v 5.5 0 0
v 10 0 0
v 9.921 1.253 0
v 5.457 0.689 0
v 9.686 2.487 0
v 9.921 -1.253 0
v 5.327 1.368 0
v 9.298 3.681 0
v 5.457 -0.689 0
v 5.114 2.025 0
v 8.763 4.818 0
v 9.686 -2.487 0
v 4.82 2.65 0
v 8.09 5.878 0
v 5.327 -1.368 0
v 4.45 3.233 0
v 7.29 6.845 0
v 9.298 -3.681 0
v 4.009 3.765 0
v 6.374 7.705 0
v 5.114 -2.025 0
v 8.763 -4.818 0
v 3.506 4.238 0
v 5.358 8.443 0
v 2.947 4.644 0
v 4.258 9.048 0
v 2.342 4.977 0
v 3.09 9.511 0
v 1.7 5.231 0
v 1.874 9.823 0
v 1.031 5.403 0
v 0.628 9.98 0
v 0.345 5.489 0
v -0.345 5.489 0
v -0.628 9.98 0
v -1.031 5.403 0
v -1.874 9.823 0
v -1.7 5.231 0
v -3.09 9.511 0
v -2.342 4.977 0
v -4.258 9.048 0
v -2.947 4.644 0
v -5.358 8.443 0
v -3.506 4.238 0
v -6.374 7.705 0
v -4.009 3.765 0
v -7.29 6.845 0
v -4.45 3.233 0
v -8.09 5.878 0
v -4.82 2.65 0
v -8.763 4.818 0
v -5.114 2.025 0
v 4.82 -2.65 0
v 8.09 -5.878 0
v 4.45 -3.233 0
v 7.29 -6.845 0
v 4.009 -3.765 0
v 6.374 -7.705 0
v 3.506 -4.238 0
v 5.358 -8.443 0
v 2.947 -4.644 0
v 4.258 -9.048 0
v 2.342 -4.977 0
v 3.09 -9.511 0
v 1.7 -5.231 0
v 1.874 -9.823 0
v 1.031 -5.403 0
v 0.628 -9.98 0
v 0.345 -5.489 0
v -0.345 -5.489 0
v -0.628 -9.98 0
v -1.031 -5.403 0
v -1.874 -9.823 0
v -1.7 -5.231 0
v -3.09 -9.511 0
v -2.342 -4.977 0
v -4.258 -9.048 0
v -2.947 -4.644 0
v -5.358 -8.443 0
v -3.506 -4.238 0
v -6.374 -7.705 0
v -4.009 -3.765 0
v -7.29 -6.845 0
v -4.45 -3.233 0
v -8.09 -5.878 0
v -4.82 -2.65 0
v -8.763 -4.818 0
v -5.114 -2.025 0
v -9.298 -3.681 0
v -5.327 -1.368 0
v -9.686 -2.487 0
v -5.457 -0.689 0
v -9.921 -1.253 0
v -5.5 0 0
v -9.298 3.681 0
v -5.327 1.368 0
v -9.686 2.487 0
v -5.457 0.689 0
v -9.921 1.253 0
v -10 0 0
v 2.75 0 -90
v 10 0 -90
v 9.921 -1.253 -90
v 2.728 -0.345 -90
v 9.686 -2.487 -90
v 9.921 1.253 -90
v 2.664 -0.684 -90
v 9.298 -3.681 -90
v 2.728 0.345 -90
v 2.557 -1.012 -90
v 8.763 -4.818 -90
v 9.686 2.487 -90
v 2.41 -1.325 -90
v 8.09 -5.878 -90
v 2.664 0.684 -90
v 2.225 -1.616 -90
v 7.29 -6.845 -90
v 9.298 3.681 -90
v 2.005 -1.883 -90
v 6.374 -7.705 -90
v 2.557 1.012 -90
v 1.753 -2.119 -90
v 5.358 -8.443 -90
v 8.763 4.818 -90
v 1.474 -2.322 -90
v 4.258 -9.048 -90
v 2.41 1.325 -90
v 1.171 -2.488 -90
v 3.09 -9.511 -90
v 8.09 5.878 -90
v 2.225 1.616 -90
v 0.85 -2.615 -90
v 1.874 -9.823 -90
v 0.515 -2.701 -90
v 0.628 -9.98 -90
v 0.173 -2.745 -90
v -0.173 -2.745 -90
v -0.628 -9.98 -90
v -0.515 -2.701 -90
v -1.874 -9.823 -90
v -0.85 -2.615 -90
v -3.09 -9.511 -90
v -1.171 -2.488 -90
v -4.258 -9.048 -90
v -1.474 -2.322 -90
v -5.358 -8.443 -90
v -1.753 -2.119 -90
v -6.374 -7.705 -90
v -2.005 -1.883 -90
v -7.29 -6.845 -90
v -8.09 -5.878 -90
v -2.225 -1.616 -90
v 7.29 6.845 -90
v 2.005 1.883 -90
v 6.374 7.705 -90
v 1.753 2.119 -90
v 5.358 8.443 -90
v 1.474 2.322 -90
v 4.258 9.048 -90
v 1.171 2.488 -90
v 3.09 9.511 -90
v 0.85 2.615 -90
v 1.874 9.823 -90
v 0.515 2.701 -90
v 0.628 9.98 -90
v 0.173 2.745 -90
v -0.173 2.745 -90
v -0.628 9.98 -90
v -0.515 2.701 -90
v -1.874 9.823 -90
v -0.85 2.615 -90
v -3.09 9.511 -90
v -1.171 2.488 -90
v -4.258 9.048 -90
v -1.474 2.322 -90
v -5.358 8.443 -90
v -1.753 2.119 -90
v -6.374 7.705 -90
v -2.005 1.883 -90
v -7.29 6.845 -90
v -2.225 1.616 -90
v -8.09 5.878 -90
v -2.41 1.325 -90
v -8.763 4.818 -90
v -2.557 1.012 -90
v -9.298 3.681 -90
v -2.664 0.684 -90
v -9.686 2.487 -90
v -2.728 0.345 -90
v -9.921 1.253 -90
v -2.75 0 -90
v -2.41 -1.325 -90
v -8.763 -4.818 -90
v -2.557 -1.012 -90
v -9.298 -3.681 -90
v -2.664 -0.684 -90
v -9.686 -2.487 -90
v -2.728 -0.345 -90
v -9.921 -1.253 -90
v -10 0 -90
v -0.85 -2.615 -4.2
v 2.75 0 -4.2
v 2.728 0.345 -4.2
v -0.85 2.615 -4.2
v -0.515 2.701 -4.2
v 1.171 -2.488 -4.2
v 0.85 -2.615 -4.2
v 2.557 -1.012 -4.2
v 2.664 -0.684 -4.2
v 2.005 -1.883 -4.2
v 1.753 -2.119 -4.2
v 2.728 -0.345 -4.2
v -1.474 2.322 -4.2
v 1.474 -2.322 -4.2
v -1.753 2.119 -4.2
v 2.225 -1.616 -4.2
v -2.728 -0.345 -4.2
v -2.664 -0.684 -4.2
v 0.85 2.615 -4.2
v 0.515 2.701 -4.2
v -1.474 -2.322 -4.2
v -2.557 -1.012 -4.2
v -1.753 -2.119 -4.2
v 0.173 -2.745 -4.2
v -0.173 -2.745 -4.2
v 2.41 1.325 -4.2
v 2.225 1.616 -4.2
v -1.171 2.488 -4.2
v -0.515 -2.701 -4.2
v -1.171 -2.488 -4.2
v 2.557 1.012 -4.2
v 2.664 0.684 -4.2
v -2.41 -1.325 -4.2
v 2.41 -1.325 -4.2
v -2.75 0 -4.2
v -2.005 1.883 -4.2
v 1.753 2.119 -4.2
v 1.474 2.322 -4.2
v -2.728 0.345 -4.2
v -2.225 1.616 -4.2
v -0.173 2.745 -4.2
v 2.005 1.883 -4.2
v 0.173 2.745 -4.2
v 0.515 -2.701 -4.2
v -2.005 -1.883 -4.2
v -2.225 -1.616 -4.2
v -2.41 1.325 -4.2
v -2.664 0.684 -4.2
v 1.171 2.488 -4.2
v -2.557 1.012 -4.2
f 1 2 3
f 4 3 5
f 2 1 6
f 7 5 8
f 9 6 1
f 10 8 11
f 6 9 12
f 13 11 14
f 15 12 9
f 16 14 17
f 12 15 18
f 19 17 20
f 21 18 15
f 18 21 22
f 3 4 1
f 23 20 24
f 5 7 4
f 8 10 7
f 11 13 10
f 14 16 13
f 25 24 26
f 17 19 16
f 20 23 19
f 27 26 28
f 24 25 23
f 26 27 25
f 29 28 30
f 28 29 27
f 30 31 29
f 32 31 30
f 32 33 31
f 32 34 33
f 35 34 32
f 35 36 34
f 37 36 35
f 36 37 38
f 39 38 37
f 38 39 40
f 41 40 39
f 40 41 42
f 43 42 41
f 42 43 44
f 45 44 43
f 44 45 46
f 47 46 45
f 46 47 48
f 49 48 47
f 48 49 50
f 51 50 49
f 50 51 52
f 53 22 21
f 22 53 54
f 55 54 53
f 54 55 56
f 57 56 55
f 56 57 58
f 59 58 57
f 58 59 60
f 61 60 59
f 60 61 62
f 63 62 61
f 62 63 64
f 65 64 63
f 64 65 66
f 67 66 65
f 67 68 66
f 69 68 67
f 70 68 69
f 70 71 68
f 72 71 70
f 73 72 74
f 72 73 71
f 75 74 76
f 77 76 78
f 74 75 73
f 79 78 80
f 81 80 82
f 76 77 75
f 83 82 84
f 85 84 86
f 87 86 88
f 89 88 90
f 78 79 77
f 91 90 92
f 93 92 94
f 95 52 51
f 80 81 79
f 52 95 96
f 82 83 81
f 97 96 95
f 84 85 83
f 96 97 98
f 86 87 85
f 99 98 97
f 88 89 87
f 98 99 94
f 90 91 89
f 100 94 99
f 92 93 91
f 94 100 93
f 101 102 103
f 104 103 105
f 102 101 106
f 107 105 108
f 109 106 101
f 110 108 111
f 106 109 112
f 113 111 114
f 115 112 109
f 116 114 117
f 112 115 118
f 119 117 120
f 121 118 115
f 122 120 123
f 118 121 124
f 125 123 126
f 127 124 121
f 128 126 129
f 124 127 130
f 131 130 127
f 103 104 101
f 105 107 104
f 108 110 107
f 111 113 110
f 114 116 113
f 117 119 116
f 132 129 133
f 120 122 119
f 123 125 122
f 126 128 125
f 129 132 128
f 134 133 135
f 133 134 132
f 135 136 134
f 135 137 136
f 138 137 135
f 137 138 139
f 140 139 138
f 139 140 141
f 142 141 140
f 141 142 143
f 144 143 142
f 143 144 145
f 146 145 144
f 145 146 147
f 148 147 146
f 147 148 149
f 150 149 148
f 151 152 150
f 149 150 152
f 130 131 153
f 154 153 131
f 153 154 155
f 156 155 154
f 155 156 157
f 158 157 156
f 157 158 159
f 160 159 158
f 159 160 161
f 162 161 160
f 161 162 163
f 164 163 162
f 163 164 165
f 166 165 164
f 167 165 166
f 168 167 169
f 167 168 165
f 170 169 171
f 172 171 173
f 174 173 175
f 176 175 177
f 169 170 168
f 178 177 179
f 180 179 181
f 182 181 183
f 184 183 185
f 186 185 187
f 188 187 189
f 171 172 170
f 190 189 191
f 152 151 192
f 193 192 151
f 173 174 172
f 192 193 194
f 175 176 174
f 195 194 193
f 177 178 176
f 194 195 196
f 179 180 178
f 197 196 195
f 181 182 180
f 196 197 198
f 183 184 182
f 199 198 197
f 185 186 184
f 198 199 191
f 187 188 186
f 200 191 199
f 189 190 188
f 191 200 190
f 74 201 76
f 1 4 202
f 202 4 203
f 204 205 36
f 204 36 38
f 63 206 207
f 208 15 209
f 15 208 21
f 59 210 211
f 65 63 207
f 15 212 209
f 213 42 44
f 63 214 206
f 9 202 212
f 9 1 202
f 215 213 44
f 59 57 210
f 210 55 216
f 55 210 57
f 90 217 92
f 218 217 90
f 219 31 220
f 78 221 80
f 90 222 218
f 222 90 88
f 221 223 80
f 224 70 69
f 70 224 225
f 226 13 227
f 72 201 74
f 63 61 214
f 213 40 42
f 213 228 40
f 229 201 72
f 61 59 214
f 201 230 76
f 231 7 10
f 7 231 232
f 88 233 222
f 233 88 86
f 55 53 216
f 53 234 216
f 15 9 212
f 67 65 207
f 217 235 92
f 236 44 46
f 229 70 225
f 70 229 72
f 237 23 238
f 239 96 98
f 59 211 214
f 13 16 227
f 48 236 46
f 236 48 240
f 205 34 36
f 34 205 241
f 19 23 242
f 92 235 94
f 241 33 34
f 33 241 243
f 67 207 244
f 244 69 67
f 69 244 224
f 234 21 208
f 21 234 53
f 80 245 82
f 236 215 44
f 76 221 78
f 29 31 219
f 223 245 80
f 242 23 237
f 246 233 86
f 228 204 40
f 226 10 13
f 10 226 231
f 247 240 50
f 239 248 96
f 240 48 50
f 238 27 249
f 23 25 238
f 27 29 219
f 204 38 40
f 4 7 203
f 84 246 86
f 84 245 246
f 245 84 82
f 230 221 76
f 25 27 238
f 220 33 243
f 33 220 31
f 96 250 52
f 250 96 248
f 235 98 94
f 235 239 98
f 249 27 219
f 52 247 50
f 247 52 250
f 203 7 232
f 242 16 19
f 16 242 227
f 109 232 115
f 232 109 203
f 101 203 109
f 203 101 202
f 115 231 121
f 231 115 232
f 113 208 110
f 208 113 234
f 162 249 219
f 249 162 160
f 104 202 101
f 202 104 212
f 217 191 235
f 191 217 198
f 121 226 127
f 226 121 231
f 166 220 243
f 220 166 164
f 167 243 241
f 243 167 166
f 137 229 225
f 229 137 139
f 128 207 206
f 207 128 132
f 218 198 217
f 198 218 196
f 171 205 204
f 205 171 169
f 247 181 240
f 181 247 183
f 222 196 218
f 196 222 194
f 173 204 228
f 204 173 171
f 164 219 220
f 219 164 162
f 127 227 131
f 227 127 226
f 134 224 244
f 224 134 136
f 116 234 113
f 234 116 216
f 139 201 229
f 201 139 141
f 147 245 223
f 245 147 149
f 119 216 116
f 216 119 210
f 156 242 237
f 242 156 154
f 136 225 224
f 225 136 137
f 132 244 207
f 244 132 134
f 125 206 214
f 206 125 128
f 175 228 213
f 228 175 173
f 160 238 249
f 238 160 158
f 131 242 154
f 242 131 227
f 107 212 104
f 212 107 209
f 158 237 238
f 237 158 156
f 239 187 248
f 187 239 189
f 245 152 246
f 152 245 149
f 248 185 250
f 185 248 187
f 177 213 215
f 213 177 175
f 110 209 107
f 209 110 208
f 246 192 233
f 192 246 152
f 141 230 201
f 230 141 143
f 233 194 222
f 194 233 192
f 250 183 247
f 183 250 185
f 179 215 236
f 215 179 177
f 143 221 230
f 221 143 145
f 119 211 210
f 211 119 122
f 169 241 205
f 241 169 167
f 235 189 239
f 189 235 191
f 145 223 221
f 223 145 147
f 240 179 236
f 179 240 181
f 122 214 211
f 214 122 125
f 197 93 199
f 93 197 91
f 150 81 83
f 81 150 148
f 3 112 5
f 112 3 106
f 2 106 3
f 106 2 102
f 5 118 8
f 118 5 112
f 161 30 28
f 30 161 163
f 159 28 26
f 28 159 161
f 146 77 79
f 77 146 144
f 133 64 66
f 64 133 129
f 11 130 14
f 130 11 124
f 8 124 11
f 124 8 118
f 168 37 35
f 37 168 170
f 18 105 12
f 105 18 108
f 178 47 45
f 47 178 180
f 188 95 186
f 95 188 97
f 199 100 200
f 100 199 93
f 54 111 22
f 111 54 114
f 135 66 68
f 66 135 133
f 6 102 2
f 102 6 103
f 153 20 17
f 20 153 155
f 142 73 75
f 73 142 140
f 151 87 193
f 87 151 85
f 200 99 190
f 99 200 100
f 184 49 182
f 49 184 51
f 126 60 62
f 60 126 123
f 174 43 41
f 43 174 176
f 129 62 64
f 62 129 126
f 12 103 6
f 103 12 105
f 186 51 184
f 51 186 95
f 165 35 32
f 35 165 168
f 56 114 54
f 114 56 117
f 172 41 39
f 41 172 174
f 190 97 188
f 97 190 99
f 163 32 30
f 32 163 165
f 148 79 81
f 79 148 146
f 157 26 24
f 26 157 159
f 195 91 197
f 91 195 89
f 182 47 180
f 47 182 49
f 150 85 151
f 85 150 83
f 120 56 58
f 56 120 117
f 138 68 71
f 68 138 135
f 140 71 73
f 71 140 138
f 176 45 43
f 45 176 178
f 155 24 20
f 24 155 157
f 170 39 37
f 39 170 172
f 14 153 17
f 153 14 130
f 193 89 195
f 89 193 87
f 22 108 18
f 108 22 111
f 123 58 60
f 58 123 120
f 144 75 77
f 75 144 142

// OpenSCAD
$fn = 50;


difference() {
	union() {
		translate(v = [0, 0, -90.0000000000]) {
			cylinder(h = 90, r = 10.0000000000);
		}
		cylinder(h = 0, r = 20.0000000000);
	}
	union() {
		translate(v = [0, 0, 0]) {
			rotate(a = [0, 0, 0]) {
				difference() {
					union() {
						#translate(v = [0, 0, -90.0000000000]) {
							cylinder(h = 90, r = 2.2500000000);
						}
						#translate(v = [0, 0, -4.2000000000]) {
							cylinder(h = 4.2000000000, r1 = 2.7500000000, r2 = 5.5000000000);
						}
						#translate(v = [0, 0, -90.0000000000]) {
							cylinder(h = 90, r = 2.7500000000);
						}
						#translate(v = [0, 0, -90.0000000000]) {
							cylinder(h = 90, r = 2.2500000000);
						}
					}
					union();
				}
			}
		}
	}
}
